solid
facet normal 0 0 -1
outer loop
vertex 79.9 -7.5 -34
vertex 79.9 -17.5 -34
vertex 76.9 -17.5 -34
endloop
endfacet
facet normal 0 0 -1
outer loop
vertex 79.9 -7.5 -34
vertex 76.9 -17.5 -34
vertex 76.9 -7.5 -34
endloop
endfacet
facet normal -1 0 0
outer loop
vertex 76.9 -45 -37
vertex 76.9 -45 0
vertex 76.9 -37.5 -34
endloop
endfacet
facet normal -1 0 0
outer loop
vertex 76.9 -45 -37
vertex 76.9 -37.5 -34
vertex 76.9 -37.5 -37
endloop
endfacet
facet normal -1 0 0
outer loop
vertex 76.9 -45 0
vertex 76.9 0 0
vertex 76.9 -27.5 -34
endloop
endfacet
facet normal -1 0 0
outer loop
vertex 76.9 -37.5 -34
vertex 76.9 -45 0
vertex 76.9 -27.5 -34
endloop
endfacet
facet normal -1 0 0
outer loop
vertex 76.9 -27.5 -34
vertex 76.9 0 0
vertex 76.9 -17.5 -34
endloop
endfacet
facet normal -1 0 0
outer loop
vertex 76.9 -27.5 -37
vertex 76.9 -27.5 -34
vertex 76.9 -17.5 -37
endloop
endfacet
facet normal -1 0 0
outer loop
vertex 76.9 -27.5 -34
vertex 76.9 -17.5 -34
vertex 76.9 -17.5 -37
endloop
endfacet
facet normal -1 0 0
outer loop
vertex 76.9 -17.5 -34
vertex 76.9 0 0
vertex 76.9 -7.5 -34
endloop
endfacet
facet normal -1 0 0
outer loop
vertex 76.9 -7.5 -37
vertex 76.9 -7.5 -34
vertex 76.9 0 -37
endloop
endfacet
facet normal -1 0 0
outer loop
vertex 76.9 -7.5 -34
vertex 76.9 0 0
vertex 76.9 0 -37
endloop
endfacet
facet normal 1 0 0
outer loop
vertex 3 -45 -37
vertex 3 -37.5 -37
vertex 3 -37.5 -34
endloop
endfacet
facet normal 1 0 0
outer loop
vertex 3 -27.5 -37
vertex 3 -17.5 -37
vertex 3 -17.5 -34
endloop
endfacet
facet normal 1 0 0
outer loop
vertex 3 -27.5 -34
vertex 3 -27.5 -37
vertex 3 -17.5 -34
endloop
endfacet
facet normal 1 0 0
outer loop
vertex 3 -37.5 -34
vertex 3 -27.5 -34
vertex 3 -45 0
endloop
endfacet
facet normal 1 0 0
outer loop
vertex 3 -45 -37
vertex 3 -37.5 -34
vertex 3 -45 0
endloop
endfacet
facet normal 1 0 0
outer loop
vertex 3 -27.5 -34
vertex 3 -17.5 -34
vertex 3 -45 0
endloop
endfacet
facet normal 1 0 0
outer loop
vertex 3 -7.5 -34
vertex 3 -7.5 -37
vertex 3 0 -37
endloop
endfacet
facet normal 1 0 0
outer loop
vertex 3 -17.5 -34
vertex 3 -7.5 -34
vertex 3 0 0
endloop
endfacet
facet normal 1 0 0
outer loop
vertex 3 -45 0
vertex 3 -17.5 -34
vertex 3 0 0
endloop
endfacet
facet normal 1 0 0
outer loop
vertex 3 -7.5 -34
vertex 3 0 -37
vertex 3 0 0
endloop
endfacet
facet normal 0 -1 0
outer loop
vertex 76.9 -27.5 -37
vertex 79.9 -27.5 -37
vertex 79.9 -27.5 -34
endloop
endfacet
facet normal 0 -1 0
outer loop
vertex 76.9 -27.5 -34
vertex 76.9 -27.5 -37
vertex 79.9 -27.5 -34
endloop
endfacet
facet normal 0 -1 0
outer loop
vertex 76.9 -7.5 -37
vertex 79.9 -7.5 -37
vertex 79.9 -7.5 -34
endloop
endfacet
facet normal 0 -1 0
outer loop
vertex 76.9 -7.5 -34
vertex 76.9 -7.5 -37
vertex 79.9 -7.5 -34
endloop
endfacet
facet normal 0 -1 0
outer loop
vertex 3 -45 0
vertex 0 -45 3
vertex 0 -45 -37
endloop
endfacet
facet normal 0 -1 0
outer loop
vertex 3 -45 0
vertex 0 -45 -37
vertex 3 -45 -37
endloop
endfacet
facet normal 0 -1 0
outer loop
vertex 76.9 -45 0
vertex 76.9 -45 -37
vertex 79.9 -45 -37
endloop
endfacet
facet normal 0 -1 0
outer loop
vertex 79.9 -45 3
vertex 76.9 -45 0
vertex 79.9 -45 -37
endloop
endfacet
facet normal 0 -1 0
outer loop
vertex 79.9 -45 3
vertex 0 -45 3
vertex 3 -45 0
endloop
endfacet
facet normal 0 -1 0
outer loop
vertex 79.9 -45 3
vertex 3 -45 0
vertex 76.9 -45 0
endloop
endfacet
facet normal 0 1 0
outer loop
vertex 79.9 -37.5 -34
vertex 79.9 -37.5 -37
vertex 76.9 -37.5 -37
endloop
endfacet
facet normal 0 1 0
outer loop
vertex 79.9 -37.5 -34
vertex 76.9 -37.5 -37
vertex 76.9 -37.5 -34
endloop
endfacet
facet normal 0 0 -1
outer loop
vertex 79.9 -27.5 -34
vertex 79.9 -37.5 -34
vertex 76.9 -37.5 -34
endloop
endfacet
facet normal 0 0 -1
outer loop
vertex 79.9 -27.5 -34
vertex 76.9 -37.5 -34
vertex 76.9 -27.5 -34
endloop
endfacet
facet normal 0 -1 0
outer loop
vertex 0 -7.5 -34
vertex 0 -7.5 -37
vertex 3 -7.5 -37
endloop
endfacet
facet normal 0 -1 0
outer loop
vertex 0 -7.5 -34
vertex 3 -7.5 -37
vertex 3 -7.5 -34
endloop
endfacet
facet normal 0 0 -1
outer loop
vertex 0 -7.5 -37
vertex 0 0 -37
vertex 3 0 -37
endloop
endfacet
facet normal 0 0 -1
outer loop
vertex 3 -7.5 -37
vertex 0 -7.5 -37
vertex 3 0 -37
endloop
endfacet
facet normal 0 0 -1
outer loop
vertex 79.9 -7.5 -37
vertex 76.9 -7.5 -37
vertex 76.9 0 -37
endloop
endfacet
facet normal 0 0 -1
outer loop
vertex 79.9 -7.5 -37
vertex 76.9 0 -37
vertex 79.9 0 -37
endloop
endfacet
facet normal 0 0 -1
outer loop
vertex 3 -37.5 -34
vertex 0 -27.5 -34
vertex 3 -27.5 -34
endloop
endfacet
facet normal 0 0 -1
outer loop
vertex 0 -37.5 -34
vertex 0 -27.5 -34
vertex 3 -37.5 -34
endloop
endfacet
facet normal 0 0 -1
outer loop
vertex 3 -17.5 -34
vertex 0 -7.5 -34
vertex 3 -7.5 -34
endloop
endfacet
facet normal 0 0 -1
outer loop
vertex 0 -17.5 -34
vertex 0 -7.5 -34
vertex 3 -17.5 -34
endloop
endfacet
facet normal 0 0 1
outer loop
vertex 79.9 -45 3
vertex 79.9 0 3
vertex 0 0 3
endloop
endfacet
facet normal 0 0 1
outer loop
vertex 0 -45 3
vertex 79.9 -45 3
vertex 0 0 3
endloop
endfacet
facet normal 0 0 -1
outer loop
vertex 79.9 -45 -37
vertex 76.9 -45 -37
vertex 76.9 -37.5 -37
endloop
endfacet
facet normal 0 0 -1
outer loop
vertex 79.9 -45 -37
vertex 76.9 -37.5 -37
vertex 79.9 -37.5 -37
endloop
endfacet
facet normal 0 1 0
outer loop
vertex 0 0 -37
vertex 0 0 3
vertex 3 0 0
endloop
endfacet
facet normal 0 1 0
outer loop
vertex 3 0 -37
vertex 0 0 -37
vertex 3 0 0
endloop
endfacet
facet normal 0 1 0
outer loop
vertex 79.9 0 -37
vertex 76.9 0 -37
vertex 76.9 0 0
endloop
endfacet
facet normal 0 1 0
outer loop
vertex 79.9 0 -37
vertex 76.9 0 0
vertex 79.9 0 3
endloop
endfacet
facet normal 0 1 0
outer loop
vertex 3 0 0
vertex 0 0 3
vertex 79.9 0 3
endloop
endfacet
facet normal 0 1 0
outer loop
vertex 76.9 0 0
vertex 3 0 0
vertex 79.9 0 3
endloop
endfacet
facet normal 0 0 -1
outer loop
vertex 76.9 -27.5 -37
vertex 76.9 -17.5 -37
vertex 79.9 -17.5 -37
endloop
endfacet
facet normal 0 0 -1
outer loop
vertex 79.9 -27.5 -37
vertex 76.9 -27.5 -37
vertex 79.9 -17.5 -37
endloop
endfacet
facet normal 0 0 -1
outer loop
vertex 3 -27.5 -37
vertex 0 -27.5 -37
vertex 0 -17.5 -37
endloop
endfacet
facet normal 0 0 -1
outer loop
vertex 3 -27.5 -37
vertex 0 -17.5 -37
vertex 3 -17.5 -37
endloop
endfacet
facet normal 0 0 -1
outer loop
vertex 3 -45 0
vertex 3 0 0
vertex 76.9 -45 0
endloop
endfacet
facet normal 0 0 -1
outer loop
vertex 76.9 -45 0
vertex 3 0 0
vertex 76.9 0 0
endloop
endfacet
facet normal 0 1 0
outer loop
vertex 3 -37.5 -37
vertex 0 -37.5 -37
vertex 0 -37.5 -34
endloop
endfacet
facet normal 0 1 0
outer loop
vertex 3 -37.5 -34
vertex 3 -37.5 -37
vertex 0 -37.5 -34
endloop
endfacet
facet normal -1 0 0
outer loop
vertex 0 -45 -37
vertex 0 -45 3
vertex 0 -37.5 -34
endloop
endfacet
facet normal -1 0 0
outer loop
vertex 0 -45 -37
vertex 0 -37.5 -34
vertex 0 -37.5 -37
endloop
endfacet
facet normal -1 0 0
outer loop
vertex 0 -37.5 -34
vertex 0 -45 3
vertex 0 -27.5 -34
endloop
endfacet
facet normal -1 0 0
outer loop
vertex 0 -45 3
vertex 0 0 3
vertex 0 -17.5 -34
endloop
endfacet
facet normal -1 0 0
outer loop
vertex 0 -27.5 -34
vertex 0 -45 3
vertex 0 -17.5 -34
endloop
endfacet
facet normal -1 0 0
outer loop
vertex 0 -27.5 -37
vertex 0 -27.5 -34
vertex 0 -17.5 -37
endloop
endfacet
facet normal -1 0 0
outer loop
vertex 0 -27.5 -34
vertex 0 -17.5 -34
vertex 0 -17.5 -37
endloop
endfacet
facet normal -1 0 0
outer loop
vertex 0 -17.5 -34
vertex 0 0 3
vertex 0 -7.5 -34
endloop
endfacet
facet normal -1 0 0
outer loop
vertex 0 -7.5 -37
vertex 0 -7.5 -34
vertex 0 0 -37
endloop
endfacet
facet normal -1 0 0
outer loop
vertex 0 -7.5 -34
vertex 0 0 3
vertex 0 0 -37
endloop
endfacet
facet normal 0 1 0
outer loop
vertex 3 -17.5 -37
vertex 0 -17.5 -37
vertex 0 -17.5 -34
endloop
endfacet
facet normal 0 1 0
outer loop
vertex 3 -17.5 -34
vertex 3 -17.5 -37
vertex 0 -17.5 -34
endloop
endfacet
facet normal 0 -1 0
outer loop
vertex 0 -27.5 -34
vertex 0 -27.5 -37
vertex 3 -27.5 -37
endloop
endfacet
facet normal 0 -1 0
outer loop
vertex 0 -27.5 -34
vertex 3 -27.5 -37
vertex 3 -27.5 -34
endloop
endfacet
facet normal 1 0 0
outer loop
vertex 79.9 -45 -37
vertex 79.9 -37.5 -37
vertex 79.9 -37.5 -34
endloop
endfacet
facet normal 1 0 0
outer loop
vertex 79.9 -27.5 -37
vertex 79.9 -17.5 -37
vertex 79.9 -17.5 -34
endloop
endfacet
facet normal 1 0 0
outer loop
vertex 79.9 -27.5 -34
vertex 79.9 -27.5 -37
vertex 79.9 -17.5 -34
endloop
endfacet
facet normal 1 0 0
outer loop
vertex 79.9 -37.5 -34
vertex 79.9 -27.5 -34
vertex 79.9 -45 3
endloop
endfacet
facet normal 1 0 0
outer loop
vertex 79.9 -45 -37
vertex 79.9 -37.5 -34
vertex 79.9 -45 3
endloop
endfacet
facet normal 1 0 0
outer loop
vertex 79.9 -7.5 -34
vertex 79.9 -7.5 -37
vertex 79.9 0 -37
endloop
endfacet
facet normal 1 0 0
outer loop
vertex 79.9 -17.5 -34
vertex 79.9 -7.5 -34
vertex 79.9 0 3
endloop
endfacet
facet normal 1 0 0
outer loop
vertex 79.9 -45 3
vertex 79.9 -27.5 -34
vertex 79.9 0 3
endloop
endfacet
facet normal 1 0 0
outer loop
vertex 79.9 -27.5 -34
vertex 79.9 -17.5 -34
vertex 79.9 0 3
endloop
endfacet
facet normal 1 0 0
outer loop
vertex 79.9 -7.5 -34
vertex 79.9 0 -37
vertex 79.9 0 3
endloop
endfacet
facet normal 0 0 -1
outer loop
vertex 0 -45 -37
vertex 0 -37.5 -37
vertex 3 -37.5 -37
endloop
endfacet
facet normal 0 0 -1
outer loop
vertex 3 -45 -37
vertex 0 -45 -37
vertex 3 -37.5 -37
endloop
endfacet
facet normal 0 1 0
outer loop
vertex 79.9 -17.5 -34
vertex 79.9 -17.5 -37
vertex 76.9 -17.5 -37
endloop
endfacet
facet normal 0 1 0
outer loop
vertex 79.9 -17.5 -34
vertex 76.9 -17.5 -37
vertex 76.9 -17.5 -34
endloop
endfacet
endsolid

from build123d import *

# Parameters (mm, degrees)
F1_DEPTH = 45
F2_W     = 10
F2_H     = 3
F3_DEPTH = 25
F4_W     = 10
F4_H     = 3
F5_DEPTH = 25


with BuildPart() as f1:
    # F0 (on Front) → F1 (new body)
    with BuildSketch(Plane.XZ):
        Polygon((79.9, 3), (0, 3), (0, -37), (3, -37), (3, 0), (76.9, 0), (76.9, -37), (79.9, -37), align=None)
    extrude(amount=F1_DEPTH)

    # F2 (on face) → F3 (cut)
    with BuildSketch(Plane.YZ.offset(79.9)):
        with Locations((-32.5, -35.5)):
            Rectangle(F2_W, F2_H)
        with Locations((-12.5, -35.5)):
            Rectangle(F2_W, F2_H)
    extrude(amount=-F3_DEPTH, mode=Mode.SUBTRACT)

    # F4 (on face) → F5 (cut)
    with BuildSketch(Plane(origin=(0, 0, 0), x_dir=(0, -1, 0), z_dir=(-1, 0, 0))):
        with Locations((12.5, -35.5)):
            Rectangle(F4_W, F4_H)
        with Locations((32.5, -35.5)):
            Rectangle(F4_W, F4_H)
    extrude(amount=-F5_DEPTH, mode=Mode.SUBTRACT)


solid = f1.part
